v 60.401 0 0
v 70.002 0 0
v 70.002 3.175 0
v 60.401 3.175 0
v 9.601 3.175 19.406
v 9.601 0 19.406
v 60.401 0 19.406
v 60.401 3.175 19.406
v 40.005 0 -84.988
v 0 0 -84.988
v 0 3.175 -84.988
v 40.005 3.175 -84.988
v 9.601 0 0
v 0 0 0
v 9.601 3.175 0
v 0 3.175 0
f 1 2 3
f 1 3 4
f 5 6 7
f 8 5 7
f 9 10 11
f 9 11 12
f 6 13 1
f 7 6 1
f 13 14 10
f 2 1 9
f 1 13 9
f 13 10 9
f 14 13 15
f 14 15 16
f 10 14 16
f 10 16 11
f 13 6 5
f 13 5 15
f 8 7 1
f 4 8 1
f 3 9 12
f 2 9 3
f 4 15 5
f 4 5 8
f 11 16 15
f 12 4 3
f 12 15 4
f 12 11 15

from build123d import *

# Parameters (mm, degrees)
SKETCH1_W           = 50.8
SKETCH1_H           = 19.4056
BOSS_EXTRUDE1_DEPTH = 3.175


with BuildPart() as part:
    # Sketch1 → Boss-Extrude1 (new body)
    with BuildSketch(Plane(origin=(0, 0, 0), x_dir=(1, 0, 0), z_dir=(0, 1, 0))):
        with Locations((35.0012, -9.7028)):
            Rectangle(SKETCH1_W, SKETCH1_H)
        Polygon((70.0024, 0), (0, 0), (0, 84.9884), (40.005, 84.9884), align=None)
    extrude(amount=BOSS_EXTRUDE1_DEPTH)


solid = part.part
